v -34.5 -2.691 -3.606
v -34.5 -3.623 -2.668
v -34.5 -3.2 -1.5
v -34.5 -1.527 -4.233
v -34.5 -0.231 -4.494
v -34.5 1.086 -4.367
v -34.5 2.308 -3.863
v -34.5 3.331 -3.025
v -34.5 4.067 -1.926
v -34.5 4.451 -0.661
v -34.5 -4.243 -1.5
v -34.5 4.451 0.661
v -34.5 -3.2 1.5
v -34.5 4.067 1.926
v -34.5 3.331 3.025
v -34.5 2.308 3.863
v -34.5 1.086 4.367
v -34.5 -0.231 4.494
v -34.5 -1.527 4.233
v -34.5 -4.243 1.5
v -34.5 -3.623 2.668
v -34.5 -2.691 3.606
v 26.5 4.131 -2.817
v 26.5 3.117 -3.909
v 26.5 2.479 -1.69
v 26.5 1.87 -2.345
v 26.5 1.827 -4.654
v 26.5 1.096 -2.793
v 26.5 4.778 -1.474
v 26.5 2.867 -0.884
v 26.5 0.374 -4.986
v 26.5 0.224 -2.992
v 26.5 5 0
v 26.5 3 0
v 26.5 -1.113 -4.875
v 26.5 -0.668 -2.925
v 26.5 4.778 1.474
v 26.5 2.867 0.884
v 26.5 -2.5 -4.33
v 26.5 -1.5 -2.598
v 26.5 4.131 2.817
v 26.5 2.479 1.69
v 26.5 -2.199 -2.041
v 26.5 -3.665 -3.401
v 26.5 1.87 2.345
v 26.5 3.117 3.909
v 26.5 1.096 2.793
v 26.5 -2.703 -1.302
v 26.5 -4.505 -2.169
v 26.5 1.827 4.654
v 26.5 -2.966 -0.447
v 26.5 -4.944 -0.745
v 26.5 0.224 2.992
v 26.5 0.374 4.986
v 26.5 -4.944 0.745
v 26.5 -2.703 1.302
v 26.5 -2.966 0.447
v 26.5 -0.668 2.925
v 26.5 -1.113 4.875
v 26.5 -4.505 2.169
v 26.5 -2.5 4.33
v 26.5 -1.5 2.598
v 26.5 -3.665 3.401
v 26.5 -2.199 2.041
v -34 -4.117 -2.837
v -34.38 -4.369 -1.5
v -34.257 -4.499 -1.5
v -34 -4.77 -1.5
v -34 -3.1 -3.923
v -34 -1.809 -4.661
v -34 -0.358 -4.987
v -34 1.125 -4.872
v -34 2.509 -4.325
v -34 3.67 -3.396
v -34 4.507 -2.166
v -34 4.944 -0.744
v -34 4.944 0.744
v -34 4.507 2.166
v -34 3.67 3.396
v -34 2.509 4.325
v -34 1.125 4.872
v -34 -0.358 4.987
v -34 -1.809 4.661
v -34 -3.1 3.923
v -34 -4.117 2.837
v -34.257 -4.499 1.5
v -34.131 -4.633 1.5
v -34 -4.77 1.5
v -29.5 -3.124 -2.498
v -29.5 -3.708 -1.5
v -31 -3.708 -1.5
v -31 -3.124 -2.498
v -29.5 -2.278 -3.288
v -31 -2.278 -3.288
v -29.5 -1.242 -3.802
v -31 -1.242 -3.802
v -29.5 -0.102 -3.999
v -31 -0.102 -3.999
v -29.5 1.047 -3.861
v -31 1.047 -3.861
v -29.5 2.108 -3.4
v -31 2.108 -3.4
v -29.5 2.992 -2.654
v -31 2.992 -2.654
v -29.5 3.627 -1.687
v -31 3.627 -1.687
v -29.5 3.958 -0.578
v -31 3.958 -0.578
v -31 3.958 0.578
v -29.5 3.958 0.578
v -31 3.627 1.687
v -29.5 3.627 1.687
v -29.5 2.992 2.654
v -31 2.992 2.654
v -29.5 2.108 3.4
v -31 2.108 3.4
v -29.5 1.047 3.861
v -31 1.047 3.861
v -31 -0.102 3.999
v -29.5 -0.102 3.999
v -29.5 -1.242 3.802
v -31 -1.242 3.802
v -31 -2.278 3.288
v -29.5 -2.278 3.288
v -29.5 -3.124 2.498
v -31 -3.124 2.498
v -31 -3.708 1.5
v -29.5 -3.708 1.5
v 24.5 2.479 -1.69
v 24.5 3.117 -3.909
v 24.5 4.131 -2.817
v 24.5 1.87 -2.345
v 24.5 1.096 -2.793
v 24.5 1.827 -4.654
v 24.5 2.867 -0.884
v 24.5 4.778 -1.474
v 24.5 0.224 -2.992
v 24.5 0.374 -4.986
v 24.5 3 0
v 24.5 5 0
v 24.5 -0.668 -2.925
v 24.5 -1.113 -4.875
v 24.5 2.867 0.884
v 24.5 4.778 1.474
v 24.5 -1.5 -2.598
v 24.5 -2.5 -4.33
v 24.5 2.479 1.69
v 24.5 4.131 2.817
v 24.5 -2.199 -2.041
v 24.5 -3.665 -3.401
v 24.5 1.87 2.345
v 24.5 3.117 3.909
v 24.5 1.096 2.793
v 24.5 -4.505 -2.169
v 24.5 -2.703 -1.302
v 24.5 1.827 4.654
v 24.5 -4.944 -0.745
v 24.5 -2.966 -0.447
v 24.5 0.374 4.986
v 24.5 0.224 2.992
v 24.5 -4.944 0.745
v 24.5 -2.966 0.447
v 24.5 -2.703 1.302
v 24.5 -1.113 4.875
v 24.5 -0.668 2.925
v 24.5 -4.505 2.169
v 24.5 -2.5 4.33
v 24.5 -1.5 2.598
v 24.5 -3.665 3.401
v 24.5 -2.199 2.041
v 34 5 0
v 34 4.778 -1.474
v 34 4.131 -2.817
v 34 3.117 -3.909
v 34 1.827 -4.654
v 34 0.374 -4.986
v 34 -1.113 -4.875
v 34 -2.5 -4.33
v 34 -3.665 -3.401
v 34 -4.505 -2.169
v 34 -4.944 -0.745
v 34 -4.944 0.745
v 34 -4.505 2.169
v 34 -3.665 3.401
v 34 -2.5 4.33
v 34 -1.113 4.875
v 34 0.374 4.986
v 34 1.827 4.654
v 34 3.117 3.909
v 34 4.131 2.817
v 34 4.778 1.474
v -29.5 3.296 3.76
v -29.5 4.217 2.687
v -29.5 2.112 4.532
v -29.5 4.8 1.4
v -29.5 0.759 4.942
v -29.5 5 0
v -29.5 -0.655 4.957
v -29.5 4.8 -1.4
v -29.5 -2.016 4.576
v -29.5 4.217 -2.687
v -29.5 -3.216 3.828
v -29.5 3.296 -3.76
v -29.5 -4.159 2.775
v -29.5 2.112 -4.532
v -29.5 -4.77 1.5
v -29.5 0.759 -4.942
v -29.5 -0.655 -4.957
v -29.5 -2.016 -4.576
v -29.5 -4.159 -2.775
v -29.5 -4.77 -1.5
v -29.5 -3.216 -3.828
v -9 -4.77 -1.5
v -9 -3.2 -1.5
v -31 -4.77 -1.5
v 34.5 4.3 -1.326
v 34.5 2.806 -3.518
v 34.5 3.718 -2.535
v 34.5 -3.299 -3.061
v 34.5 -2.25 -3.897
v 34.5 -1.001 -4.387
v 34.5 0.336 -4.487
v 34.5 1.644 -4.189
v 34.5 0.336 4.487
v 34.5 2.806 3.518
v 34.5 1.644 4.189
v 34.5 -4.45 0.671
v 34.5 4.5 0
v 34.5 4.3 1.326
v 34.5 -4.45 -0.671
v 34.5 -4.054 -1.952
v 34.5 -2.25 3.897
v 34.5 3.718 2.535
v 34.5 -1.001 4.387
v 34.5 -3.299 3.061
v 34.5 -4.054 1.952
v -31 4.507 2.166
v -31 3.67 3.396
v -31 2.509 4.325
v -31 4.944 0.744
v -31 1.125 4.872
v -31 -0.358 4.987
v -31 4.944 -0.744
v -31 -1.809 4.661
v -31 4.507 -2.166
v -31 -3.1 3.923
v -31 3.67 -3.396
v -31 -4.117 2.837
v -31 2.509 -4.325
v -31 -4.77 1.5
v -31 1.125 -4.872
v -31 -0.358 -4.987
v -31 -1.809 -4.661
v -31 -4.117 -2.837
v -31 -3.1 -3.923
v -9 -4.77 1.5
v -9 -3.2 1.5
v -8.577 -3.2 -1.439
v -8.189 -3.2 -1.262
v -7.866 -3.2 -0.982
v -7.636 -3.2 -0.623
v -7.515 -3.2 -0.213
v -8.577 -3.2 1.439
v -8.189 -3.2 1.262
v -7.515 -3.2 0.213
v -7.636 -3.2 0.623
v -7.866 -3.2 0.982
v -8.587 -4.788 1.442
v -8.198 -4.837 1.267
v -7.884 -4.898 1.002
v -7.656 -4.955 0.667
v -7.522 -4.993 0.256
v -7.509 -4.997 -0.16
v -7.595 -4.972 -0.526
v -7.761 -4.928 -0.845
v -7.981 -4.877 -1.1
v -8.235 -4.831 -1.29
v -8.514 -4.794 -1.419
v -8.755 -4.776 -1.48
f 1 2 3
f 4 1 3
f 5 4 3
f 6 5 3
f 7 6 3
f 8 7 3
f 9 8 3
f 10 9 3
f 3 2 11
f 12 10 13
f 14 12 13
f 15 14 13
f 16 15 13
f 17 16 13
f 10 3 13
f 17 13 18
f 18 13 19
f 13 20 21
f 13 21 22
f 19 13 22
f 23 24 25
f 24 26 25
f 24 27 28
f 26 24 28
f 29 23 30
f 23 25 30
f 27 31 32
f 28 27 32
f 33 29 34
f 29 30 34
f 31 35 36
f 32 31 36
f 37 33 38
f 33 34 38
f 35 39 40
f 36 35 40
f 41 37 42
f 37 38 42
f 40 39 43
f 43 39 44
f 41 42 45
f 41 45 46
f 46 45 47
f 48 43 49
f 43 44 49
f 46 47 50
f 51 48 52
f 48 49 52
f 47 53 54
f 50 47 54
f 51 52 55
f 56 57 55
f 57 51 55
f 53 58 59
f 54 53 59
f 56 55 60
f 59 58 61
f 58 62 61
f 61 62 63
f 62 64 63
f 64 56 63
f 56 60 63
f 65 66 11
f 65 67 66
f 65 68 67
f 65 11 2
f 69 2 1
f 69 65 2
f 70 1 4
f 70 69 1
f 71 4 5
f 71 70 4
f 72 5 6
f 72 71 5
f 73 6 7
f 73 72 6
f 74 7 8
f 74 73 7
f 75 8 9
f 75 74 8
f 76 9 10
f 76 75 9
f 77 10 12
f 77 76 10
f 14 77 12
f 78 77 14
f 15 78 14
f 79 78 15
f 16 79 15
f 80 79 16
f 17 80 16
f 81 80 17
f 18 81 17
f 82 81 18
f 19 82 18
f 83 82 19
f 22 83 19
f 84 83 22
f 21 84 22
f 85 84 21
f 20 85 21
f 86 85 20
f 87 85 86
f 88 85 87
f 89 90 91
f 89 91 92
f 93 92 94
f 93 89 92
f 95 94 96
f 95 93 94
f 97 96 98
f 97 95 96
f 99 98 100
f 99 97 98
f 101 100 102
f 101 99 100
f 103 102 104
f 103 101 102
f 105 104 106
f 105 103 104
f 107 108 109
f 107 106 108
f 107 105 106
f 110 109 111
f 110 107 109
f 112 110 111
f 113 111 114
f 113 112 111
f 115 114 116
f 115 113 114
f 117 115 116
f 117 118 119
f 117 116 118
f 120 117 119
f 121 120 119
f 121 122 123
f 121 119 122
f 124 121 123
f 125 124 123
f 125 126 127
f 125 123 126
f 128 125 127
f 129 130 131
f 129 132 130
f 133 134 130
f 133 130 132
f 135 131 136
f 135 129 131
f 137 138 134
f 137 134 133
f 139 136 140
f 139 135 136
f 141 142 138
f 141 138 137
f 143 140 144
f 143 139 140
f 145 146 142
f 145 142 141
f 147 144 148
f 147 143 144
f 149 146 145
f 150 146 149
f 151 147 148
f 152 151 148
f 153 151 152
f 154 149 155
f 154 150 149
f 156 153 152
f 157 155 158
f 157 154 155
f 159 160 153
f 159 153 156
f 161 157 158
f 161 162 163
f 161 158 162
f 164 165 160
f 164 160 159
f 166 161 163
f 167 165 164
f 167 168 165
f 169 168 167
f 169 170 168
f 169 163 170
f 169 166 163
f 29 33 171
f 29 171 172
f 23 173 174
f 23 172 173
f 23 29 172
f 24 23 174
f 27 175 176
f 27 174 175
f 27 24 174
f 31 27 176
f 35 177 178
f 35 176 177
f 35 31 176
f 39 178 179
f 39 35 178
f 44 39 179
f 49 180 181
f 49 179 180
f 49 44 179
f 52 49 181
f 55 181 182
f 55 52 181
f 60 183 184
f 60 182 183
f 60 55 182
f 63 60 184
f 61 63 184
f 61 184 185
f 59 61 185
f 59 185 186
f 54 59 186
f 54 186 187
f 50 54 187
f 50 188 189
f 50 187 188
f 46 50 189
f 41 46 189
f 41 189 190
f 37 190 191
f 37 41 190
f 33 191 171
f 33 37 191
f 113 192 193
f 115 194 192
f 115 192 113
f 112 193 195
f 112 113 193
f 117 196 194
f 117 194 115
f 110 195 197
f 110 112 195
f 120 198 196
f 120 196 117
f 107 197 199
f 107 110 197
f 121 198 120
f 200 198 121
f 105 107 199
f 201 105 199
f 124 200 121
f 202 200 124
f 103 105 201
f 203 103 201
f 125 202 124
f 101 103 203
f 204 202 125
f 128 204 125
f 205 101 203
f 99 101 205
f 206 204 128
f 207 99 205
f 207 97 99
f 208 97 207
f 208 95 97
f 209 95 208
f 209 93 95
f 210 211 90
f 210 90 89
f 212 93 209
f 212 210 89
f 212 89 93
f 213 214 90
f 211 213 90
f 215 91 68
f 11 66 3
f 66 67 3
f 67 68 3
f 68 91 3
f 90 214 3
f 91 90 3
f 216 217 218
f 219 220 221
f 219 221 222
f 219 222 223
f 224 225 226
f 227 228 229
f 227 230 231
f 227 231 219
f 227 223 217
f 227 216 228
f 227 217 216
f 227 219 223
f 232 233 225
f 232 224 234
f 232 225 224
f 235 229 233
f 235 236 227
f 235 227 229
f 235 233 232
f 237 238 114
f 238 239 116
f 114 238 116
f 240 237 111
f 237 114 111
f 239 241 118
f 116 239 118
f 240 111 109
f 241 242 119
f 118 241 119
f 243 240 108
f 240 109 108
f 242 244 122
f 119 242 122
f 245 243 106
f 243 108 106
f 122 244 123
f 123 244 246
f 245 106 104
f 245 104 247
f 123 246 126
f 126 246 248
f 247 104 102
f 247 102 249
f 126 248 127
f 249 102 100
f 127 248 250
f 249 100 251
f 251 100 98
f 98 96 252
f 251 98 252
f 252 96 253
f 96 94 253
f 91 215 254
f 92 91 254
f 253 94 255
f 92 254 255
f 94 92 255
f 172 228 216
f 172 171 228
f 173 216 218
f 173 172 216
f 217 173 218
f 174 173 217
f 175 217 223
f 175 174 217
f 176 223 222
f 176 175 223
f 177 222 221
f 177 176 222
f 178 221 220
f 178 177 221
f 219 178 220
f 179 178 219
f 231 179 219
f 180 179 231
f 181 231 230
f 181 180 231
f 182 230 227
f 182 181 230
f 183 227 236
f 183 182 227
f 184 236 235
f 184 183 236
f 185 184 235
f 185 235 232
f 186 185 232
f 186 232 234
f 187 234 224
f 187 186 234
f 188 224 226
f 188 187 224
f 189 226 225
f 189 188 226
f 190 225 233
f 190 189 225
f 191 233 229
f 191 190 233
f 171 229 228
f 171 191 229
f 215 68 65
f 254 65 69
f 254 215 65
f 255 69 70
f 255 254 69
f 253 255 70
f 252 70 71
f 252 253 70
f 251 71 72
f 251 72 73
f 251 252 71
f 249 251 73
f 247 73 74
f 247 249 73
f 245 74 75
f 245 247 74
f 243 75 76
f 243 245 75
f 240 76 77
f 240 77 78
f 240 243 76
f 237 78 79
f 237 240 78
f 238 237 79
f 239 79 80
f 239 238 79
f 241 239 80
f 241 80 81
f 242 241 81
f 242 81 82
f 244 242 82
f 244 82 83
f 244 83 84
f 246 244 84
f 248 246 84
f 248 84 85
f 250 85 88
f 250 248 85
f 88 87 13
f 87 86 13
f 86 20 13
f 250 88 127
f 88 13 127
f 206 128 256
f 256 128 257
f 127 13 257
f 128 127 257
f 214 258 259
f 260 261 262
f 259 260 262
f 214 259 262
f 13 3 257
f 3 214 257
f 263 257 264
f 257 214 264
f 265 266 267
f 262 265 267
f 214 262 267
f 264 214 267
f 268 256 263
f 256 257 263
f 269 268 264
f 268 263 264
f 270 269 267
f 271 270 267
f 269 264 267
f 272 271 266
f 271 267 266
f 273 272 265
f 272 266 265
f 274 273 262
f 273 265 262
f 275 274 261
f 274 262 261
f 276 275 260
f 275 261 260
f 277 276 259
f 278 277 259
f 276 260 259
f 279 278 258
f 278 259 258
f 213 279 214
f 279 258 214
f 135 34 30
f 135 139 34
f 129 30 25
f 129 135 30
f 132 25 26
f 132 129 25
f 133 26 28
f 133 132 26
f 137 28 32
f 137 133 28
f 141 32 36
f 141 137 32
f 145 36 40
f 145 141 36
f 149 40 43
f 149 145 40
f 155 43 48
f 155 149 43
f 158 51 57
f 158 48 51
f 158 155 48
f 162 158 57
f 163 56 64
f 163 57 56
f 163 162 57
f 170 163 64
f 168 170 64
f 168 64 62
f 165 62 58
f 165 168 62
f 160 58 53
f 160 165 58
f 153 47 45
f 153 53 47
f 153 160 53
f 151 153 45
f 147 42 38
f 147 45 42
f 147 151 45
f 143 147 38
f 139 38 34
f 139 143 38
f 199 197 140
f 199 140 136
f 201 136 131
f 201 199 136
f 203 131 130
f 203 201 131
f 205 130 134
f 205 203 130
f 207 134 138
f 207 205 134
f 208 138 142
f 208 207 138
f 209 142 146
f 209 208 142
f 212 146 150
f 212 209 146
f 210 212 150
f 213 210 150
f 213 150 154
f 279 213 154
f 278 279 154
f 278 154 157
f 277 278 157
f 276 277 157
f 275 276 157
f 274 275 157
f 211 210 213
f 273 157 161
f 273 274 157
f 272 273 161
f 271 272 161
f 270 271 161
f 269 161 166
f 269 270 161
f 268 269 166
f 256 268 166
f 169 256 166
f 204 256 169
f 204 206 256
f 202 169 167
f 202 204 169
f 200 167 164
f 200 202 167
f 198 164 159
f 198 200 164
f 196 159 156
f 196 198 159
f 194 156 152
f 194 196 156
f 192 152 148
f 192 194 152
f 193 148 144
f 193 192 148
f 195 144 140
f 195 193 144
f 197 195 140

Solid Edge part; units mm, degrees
sketch "Sketch1" plane through (0, 0, 0) normal (1, 0, 0) x (0, 1, 0)
  circle A0 centre (0, 0) radius 5
extrude "Protrusion1" add sketch "Sketch1" along normal mid plane 69
sketch "Sketch2" plane through (24.5, 0, 0) normal (1, 0, 0) x (0, 1, 0)
  circle A0 centre (0, 0) radius 5
extrude "ExtrudedCutout_1" cut sketch "Sketch2" along normal blind 2
sketch "Sketch3" plane through (24.5, 0, 0) normal (1, 0, 0) x (0, 1, 0)
  circle A0 centre (0, 0) radius 3
extrude "ExtrudedProtrusion_4" add sketch "Sketch3" along normal blind 2
sketch "Sketch4" plane through (-29.5, 0, 0) normal (-1, 0, 0) x (0, -1, 0)
  circle A0 centre (0, 0) radius 5
extrude "ExtrudedCutout_2" cut sketch "Sketch4" along normal blind 1.5
sketch "Sketch5" plane through (-29.5, 0, 0) normal (-1, 0, 0) x (0, -1, 0)
  circle A0 centre (0, 0) radius 4
extrude "ExtrudedProtrusion_5" add sketch "Sketch5" along normal blind 1.5
chamfer "Chamfer_1" distance 0.5 angle 45 2 edges at (-34.5, -5, 0) (34.5, -5, 0) measured on face at (-34.5, 3.2333, -3.4333)
sketch "Sketch6" plane through (0, -3.2, 0) normal (0, -1, 0) x (1, 0, 0)
  line L0 (-34.5, -1.5) -> (-34.5, 1.5)
  line L1 (-34.5, 1.5) -> (-9, 1.5)
  arc A0 (-9, 1.5) -> (-9, -1.5) centre (-9, 0) cw
  line L2 (-9, -1.5) -> (-34.5, -1.5)
extrude "ExtrudedCutout_3" cut sketch "Sketch6" along normal blind 30
cosmetic_thread "Thread_5" size "M10 x 1.25" thread depth 7
